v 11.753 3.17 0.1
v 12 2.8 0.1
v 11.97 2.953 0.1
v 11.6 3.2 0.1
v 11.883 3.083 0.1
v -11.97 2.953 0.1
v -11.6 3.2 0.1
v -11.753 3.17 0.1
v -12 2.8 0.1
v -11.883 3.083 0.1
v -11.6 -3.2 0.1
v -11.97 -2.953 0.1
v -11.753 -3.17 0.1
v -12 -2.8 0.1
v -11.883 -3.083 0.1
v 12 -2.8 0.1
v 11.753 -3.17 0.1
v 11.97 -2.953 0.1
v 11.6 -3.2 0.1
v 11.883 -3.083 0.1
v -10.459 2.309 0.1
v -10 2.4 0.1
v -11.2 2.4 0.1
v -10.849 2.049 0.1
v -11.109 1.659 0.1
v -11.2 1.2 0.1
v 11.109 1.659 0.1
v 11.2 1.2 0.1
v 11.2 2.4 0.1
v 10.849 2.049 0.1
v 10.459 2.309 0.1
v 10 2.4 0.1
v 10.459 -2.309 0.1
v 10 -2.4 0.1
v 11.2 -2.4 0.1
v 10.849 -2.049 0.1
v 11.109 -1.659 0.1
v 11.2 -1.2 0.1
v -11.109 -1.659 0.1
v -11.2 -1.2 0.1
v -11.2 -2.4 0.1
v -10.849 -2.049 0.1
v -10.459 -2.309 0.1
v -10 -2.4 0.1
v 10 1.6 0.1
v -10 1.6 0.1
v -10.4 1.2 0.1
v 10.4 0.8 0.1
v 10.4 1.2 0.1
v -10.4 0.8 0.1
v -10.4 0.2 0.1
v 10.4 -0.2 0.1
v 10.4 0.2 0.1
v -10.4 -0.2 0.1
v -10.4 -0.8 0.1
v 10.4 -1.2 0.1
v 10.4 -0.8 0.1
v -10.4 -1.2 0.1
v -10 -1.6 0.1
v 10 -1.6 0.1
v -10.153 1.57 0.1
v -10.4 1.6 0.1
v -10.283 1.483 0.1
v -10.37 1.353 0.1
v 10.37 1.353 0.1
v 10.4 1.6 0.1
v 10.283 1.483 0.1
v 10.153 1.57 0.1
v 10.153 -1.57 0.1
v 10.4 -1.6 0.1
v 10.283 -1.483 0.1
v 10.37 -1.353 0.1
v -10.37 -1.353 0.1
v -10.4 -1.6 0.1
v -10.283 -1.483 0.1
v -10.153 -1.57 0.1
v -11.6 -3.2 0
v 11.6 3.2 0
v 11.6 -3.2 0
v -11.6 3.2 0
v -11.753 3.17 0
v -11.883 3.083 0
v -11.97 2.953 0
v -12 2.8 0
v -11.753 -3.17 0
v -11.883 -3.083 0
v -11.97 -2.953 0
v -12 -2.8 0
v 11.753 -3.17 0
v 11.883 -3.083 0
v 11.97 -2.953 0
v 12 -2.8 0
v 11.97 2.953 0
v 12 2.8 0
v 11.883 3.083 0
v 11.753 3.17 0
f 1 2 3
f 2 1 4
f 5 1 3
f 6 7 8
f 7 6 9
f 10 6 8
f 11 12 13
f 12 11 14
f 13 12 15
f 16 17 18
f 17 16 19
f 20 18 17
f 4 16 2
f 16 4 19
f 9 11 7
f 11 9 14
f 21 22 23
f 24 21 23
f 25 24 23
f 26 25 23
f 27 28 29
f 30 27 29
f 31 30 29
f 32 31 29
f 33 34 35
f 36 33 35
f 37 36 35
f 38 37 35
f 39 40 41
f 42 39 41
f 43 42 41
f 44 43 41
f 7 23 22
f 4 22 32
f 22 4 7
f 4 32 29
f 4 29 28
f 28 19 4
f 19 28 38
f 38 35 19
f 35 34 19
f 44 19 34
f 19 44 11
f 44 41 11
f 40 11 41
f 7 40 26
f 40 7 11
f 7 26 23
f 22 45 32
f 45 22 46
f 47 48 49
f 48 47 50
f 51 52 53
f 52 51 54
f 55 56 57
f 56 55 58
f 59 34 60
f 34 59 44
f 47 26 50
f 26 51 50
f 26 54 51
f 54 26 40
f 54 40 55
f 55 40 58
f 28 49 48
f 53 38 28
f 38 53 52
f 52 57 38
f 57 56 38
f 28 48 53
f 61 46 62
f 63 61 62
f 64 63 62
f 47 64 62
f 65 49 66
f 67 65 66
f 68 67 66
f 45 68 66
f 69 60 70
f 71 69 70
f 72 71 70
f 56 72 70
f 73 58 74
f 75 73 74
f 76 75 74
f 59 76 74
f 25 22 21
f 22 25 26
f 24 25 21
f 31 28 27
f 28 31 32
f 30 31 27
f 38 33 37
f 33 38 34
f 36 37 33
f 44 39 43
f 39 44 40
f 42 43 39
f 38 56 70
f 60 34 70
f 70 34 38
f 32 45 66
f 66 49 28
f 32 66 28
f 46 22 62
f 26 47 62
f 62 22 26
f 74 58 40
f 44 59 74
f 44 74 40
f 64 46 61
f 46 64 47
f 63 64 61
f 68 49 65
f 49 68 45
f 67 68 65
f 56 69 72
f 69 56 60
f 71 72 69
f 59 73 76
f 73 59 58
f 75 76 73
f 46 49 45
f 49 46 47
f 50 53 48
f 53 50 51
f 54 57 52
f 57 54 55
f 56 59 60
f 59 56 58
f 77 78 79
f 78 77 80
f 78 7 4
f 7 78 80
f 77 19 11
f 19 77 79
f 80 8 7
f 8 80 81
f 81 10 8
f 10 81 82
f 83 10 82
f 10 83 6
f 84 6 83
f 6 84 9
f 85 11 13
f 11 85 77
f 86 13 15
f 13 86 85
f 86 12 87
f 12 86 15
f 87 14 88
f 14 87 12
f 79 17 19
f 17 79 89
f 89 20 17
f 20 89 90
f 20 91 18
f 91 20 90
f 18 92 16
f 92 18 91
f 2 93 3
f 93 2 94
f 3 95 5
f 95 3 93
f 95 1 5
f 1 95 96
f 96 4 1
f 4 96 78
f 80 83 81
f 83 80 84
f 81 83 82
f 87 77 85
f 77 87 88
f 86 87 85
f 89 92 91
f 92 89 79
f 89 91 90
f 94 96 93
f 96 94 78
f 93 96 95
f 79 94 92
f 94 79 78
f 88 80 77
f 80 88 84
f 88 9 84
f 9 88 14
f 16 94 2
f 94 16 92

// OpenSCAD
// file: ../p/4-4edge.scad
use <../lib.scad>
$fa=1; $fs=0.2;
function ldraw_lib__4_4edge(realsolid=false) = [
// 0 Circle 1.0
// 0 Name: 4-4edge.dat
// 0 Author: James Jessiman
// 0 !LDRAW_ORG Primitive UPDATE 2017-01
// 0 !LICENSE Licensed under CC BY 2.0 and CC BY 4.0 : see CAreadme.txt
// 
// 0 BFC CERTIFY CCW
  [0,"BFC","CERTIFY"],
  [0,"BFC","CCW"],
// 
// 0 !HISTORY 1998-12-15 [PTadmin] Official Update 1998-10
// 0 !HISTORY 2005-12-28 [PTadmin] Official Update 2005-01
// 0 !HISTORY 2007-06-24 [PTadmin] Header formatted for Contributor Agreement
// 0 !HISTORY 2008-07-01 [PTadmin] Official Update 2008-01
// 0 !HISTORY 2017-01-15 [Steffen] BFCed
// 0 !HISTORY 2017-12-30 [PTadmin] Official Update 2017-01
// 
// 
// 2 24 1 0 0 0.9239 0 0.3827
  [2,24,1,0,0,0.9239,0,0.3827],
// 2 24 0.9239 0 0.3827 0.7071 0 0.7071
  [2,24,0.9239,0,0.3827,0.7071,0,0.7071],
// 2 24 0.7071 0 0.7071 0.3827 0 0.9239
  [2,24,0.7071,0,0.7071,0.3827,0,0.9239],
// 2 24 0.3827 0 0.9239 0 0 1
  [2,24,0.3827,0,0.9239,0,0,1],
// 2 24 0 0 1 -0.3827 0 0.9239
  [2,24,0,0,1,-0.3827,0,0.9239],
// 2 24 -0.3827 0 0.9239 -0.7071 0 0.7071
  [2,24,-0.3827,0,0.9239,-0.7071,0,0.7071],
// 2 24 -0.7071 0 0.7071 -0.9239 0 0.3827
  [2,24,-0.7071,0,0.7071,-0.9239,0,0.3827],
// 2 24 -0.9239 0 0.3827 -1 0 -0
  [2,24,-0.9239,0,0.3827,-1,0,-0],
// 2 24 -1 0 -0 -0.9239 0 -0.3827
  [2,24,-1,0,-0,-0.9239,0,-0.3827],
// 2 24 -0.9239 0 -0.3827 -0.7071 0 -0.7071
  [2,24,-0.9239,0,-0.3827,-0.7071,0,-0.7071],
// 2 24 -0.7071 0 -0.7071 -0.3827 0 -0.9239
  [2,24,-0.7071,0,-0.7071,-0.3827,0,-0.9239],
// 2 24 -0.3827 0 -0.9239 0 0 -1
  [2,24,-0.3827,0,-0.9239,0,0,-1],
// 2 24 0 0 -1 0.3827 0 -0.9239
  [2,24,0,0,-1,0.3827,0,-0.9239],
// 2 24 0.3827 0 -0.9239 0.7071 0 -0.7071
  [2,24,0.3827,0,-0.9239,0.7071,0,-0.7071],
// 2 24 0.7071 0 -0.7071 0.9239 0 -0.3827
  [2,24,0.7071,0,-0.7071,0.9239,0,-0.3827],
// 2 24 0.9239 0 -0.3827 1 0 0
  [2,24,0.9239,0,-0.3827,1,0,0],
];
module ldraw_lib__4_4edge(step=0, col=false, unit=2/5, alt=false, line=0.2, solid=!$preview)
    makepoly(ldraw_lib__4_4edge(solid), step=step, col=col, unit=unit, alt=alt, line=line, solid=solid);
ldraw_lib__4_4edge(line=0.2);
// file: ../p/4-4disc.scad
use <../lib.scad>
$fa=1; $fs=0.2;
function ldraw_lib__4_4disc(realsolid=false) = [
// 0 Disc 1.0
// 0 Name: 4-4disc.dat
// 0 Author: James Jessiman
// 0 !LDRAW_ORG Primitive UPDATE 2002-02
// 0 !LICENSE Licensed under CC BY 2.0 and CC BY 4.0 : see CAreadme.txt
// 
// 0 BFC CERTIFY CCW
  [0,"BFC","CERTIFY"],
  [0,"BFC","CCW"],
// 
// 0 !HISTORY 1998-12-15 [PTadmin] Official Update 1998-10
// 0 !HISTORY 2002-03-23 [sbliss] Added BFC statement
// 0 !HISTORY 2002-04-25 [PTadmin] Official Update 2002-02
// 0 !HISTORY 2007-06-24 [PTadmin] Header formatted for Contributor Agreement
// 0 !HISTORY 2008-07-01 [PTadmin] Official Update 2008-01
// 
// 
// 3 16 0 0 0 1 0 0 0.9239 0 0.3827
  [3,16,0,0,0,1,0,0,0.9239,0,0.3827],
// 3 16 0 0 0 0.9239 0 0.3827 0.7071 0 0.7071
  [3,16,0,0,0,0.9239,0,0.3827,0.7071,0,0.7071],
// 3 16 0 0 0 0.7071 0 0.7071 0.3827 0 0.9239
  [3,16,0,0,0,0.7071,0,0.7071,0.3827,0,0.9239],
// 3 16 0 0 0 0.3827 0 0.9239 0 0 1
  [3,16,0,0,0,0.3827,0,0.9239,0,0,1],
// 3 16 0 0 0 0 0 1 -0.3827 0 0.9239
  [3,16,0,0,0,0,0,1,-0.3827,0,0.9239],
// 3 16 0 0 0 -0.3827 0 0.9239 -0.7071 0 0.7071
  [3,16,0,0,0,-0.3827,0,0.9239,-0.7071,0,0.7071],
// 3 16 0 0 0 -0.7071 0 0.7071 -0.9239 0 0.3827
  [3,16,0,0,0,-0.7071,0,0.7071,-0.9239,0,0.3827],
// 3 16 0 0 0 -0.9239 0 0.3827 -1 0 -0
  [3,16,0,0,0,-0.9239,0,0.3827,-1,0,-0],
// 3 16 0 0 0 -1 0 -0 -0.9239 0 -0.3827
  [3,16,0,0,0,-1,0,-0,-0.9239,0,-0.3827],
// 3 16 0 0 0 -0.9239 0 -0.3827 -0.7071 0 -0.7071
  [3,16,0,0,0,-0.9239,0,-0.3827,-0.7071,0,-0.7071],
// 3 16 0 0 0 -0.7071 0 -0.7071 -0.3827 0 -0.9239
  [3,16,0,0,0,-0.7071,0,-0.7071,-0.3827,0,-0.9239],
// 3 16 0 0 0 -0.3827 0 -0.9239 0 0 -1
  [3,16,0,0,0,-0.3827,0,-0.9239,0,0,-1],
// 3 16 0 0 0 0 0 -1 0.3827 0 -0.9239
  [3,16,0,0,0,0,0,-1,0.3827,0,-0.9239],
// 3 16 0 0 0 0.3827 0 -0.9239 0.7071 0 -0.7071
  [3,16,0,0,0,0.3827,0,-0.9239,0.7071,0,-0.7071],
// 3 16 0 0 0 0.7071 0 -0.7071 0.9239 0 -0.3827
  [3,16,0,0,0,0.7071,0,-0.7071,0.9239,0,-0.3827],
// 3 16 0 0 0 0.9239 0 -0.3827 1 0 0
  [3,16,0,0,0,0.9239,0,-0.3827,1,0,0],
// 0
];
module ldraw_lib__4_4disc(step=0, col=false, unit=2/5, alt=false, line=0.2, solid=!$preview)
    makepoly(ldraw_lib__4_4disc(solid), step=step, col=col, unit=unit, alt=alt, line=line, solid=solid);
ldraw_lib__4_4disc(line=0.2);
// file: ../p/4-4cyli.scad
use <../lib.scad>
$fa=1; $fs=0.2;
function ldraw_lib__4_4cyli(realsolid=false) = [
// 0 Cylinder 1.0
// 0 Name: 4-4cyli.dat
// 0 Author: James Jessiman
// 0 !LDRAW_ORG Primitive UPDATE 2005-01
// 0 !LICENSE Licensed under CC BY 2.0 and CC BY 4.0 : see CAreadme.txt
// 
// 0 BFC CERTIFY CCW
  [0,"BFC","CERTIFY"],
  [0,"BFC","CCW"],
// 
// 0 !HISTORY 1998-12-15 [PTadmin] Official Update 1998-10
// 0 !HISTORY 2002-03-23 [sbliss] Added BFC statement; merged headers from files in distributions LDraw 0.27 and Complete.
// 0 !HISTORY 2002-04-25 [PTadmin] Official Update 2002-02
// 0 !HISTORY 2004-12-14 [guyvivan] BFC CCW
// 0 !HISTORY 2005-12-28 [PTadmin] Official Update 2005-01
// 0 !HISTORY 2007-06-24 [PTadmin] Header formatted for Contributor Agreement
// 0 !HISTORY 2008-07-01 [PTadmin] Official Update 2008-01
// 
// 
// 4 16 1 1 0 0.9239 1 0.3827 0.9239 0 0.3827 1 0 0
  [4,16,1,1,0,0.9239,1,0.3827,0.9239,0,0.3827,1,0,0],
// 5 24 1 0 0 1 1 0 0.9239 0 0.3827 0.9239 0 -0.3827
  [5,24,1,0,0,1,1,0,0.9239,0,0.3827,0.9239,0,-0.3827],
// 4 16 0.9239 1 0.3827 0.7071 1 0.7071 0.7071 0 0.7071 0.9239 0 0.3827
  [4,16,0.9239,1,0.3827,0.7071,1,0.7071,0.7071,0,0.7071,0.9239,0,0.3827],
// 5 24 0.9239 0 0.3827 0.9239 1 0.3827 0.7071 0 0.7071 1 0 0
  [5,24,0.9239,0,0.3827,0.9239,1,0.3827,0.7071,0,0.7071,1,0,0],
// 4 16 0.7071 1 0.7071 0.3827 1 0.9239 0.3827 0 0.9239 0.7071 0 0.7071
  [4,16,0.7071,1,0.7071,0.3827,1,0.9239,0.3827,0,0.9239,0.7071,0,0.7071],
// 5 24 0.7071 0 0.7071 0.7071 1 0.7071 0.3827 0 0.9239 0.9239 0 0.3827
  [5,24,0.7071,0,0.7071,0.7071,1,0.7071,0.3827,0,0.9239,0.9239,0,0.3827],
// 4 16 0.3827 1 0.9239 0 1 1 0 0 1 0.3827 0 0.9239
  [4,16,0.3827,1,0.9239,0,1,1,0,0,1,0.3827,0,0.9239],
// 5 24 0.3827 0 0.9239 0.3827 1 0.9239 0 0 1 0.7071 0 0.7071
  [5,24,0.3827,0,0.9239,0.3827,1,0.9239,0,0,1,0.7071,0,0.7071],
// 4 16 0 1 1 -0.3827 1 0.9239 -0.3827 0 0.9239 0 0 1
  [4,16,0,1,1,-0.3827,1,0.9239,-0.3827,0,0.9239,0,0,1],
// 5 24 0 0 1 0 1 1 -0.3827 0 0.9239 0.3827 0 0.9239
  [5,24,0,0,1,0,1,1,-0.3827,0,0.9239,0.3827,0,0.9239],
// 4 16 -0.3827 1 0.9239 -0.7071 1 0.7071 -0.7071 0 0.7071 -0.3827 0 0.9239
  [4,16,-0.3827,1,0.9239,-0.7071,1,0.7071,-0.7071,0,0.7071,-0.3827,0,0.9239],
// 5 24 -0.3827 0 0.9239 -0.3827 1 0.9239 -0.7071 0 0.7071 0 0 1
  [5,24,-0.3827,0,0.9239,-0.3827,1,0.9239,-0.7071,0,0.7071,0,0,1],
// 4 16 -0.7071 1 0.7071 -0.9239 1 0.3827 -0.9239 0 0.3827 -0.7071 0 0.7071
  [4,16,-0.7071,1,0.7071,-0.9239,1,0.3827,-0.9239,0,0.3827,-0.7071,0,0.7071],
// 5 24 -0.7071 0 0.7071 -0.7071 1 0.7071 -0.9239 0 0.3827 -0.3827 0 0.9239
  [5,24,-0.7071,0,0.7071,-0.7071,1,0.7071,-0.9239,0,0.3827,-0.3827,0,0.9239],
// 4 16 -0.9239 1 0.3827 -1 1 0 -1 0 0 -0.9239 0 0.3827
  [4,16,-0.9239,1,0.3827,-1,1,0,-1,0,0,-0.9239,0,0.3827],
// 5 24 -0.9239 0 0.3827 -0.9239 1 0.3827 -1 0 0 -0.7071 0 0.7071
  [5,24,-0.9239,0,0.3827,-0.9239,1,0.3827,-1,0,0,-0.7071,0,0.7071],
// 4 16 -1 1 0 -0.9239 1 -0.3827 -0.9239 0 -0.3827 -1 0 0
  [4,16,-1,1,0,-0.9239,1,-0.3827,-0.9239,0,-0.3827,-1,0,0],
// 5 24 -1 0 0 -1 1 0 -0.9239 0 -0.3827 -0.9239 0 0.3827
  [5,24,-1,0,0,-1,1,0,-0.9239,0,-0.3827,-0.9239,0,0.3827],
// 4 16 -0.9239 1 -0.3827 -0.7071 1 -0.7071 -0.7071 0 -0.7071 -0.9239 0 -0.3827
  [4,16,-0.9239,1,-0.3827,-0.7071,1,-0.7071,-0.7071,0,-0.7071,-0.9239,0,-0.3827],
// 5 24 -0.9239 0 -0.3827 -0.9239 1 -0.3827 -0.7071 0 -0.7071 -1 0 0
  [5,24,-0.9239,0,-0.3827,-0.9239,1,-0.3827,-0.7071,0,-0.7071,-1,0,0],
// 4 16 -0.7071 1 -0.7071 -0.3827 1 -0.9239 -0.3827 0 -0.9239 -0.7071 0 -0.7071
  [4,16,-0.7071,1,-0.7071,-0.3827,1,-0.9239,-0.3827,0,-0.9239,-0.7071,0,-0.7071],
// 5 24 -0.7071 0 -0.7071 -0.7071 1 -0.7071 -0.3827 0 -0.9239 -0.9239 0 -0.3827
  [5,24,-0.7071,0,-0.7071,-0.7071,1,-0.7071,-0.3827,0,-0.9239,-0.9239,0,-0.3827],
// 4 16 -0.3827 1 -0.9239 0 1 -1 0 0 -1 -0.3827 0 -0.9239
  [4,16,-0.3827,1,-0.9239,0,1,-1,0,0,-1,-0.3827,0,-0.9239],
// 5 24 -0.3827 0 -0.9239 -0.3827 1 -0.9239 0 0 -1 -0.7071 0 -0.7071
  [5,24,-0.3827,0,-0.9239,-0.3827,1,-0.9239,0,0,-1,-0.7071,0,-0.7071],
// 4 16 0 1 -1 0.3827 1 -0.9239 0.3827 0 -0.9239 0 0 -1
  [4,16,0,1,-1,0.3827,1,-0.9239,0.3827,0,-0.9239,0,0,-1],
// 5 24 0 0 -1 0 1 -1 0.3827 0 -0.9239 -0.3827 0 -0.9239
  [5,24,0,0,-1,0,1,-1,0.3827,0,-0.9239,-0.3827,0,-0.9239],
// 4 16 0.3827 1 -0.9239 0.7071 1 -0.7071 0.7071 0 -0.7071 0.3827 0 -0.9239
  [4,16,0.3827,1,-0.9239,0.7071,1,-0.7071,0.7071,0,-0.7071,0.3827,0,-0.9239],
// 5 24 0.3827 0 -0.9239 0.3827 1 -0.9239 0.7071 0 -0.7071 0 0 -1
  [5,24,0.3827,0,-0.9239,0.3827,1,-0.9239,0.7071,0,-0.7071,0,0,-1],
// 4 16 0.7071 1 -0.7071 0.9239 1 -0.3827 0.9239 0 -0.3827 0.7071 0 -0.7071
  [4,16,0.7071,1,-0.7071,0.9239,1,-0.3827,0.9239,0,-0.3827,0.7071,0,-0.7071],
// 5 24 0.7071 0 -0.7071 0.7071 1 -0.7071 0.9239 0 -0.3827 0.3827 0 -0.9239
  [5,24,0.7071,0,-0.7071,0.7071,1,-0.7071,0.9239,0,-0.3827,0.3827,0,-0.9239],
// 4 16 0.9239 1 -0.3827 1 1 0 1 0 0 0.9239 0 -0.3827
  [4,16,0.9239,1,-0.3827,1,1,0,1,0,0,0.9239,0,-0.3827],
// 5 24 0.9239 0 -0.3827 0.9239 1 -0.3827 1 0 0 0.7071 0 -0.7071
  [5,24,0.9239,0,-0.3827,0.9239,1,-0.3827,1,0,0,0.7071,0,-0.7071],
// 0
];
module ldraw_lib__4_4cyli(step=0, col=false, unit=2/5, alt=false, line=0.2, solid=!$preview)
    makepoly(ldraw_lib__4_4cyli(solid), step=step, col=col, unit=unit, alt=alt, line=line, solid=solid);
ldraw_lib__4_4cyli(line=0.2);
// file: ../p/stud3.scad
use <../lib.scad>
use <4-4cyli.scad>
use <4-4disc.scad>
use <4-4edge.scad>
$fa=1; $fs=0.2;
function ldraw_lib__stud3(realsolid=false) = realsolid ? 
    [openscad(translate([0,0,-eps()], o=cylinder(4+eps(), r=4)),2)] : [
// 0 Stud Tube Solid
// 0 Name: stud3.dat
// 0 Author: James Jessiman
// 0 !LDRAW_ORG Primitive UPDATE 2012-01
// 0 !LICENSE Licensed under CC BY 2.0 and CC BY 4.0 : see CAreadme.txt
// 
// 0 BFC CERTIFY CCW
  [0,"BFC","CERTIFY"],
  [0,"BFC","CCW"],
// 
// 0 !HISTORY 2002-04-04 [sbliss] Modified for BFC compliance
// 0 !HISTORY 2002-04-25 [PTadmin] Official Update 2002-02
// 0 !HISTORY 2007-06-24 [PTadmin] Header formatted for Contributor Agreement
// 0 !HISTORY 2008-07-01 [PTadmin] Official Update 2008-01
// 0 !HISTORY 2012-02-16 [Philo] Changed to CCW
// 0 !HISTORY 2012-03-30 [PTadmin] Official Update 2012-01
// 
// 
// 1 16 0 -4 0 4 0 0 0 1 0 0 0 4 4-4edge.dat
  [1,16,0,-4,0,4,0,0,0,1,0,0,0,4, ldraw_lib__4_4edge(realsolid)],
// 1 16 0 0 0 4 0 0 0 1 0 0 0 4 4-4edge.dat
  [1,16,0,0,0,4,0,0,0,1,0,0,0,4, ldraw_lib__4_4edge(realsolid)],
// 1 16 0 -4 0 4 0 0 0 1 0 0 0 4 4-4disc.dat
  [1,16,0,-4,0,4,0,0,0,1,0,0,0,4, ldraw_lib__4_4disc(realsolid)],
// 1 16 0 -4 0 4 0 0 0 4 0 0 0 4 4-4cyli.dat
  [1,16,0,-4,0,4,0,0,0,4,0,0,0,4, ldraw_lib__4_4cyli(realsolid)],
];
module ldraw_lib__stud3(step=0, col=false, unit=2/5, alt=false, line=0.2, solid=!$preview)
    makepoly(ldraw_lib__stud3(solid), step=step, col=col, unit=unit, alt=alt, line=line, solid=solid);
ldraw_lib__stud3(line=0.2);
// file: ../p/stud.scad
use <../lib.scad>
use <4-4cyli.scad>
use <4-4disc.scad>
use <4-4edge.scad>
$fa=1; $fs=0.2;
function ldraw_lib__stud(realsolid=false) = realsolid ? 
    [openscad(translate([0,0,-eps()], o=cylinder(4+eps(), r=6)),2)] : [
// 0 Stud
// 0 Name: stud.dat
// 0 Author: James Jessiman
// 0 !LDRAW_ORG Primitive UPDATE 2012-01
// 0 !LICENSE Licensed under CC BY 2.0 and CC BY 4.0 : see CAreadme.txt
// 
// 0 BFC CERTIFY CCW
  [0,"BFC","CERTIFY"],
  [0,"BFC","CCW"],
// 
// 0 !HISTORY 2002-04-04 [sbliss] Modified for BFC compliance
// 0 !HISTORY 2002-04-25 [PTadmin] Official Update 2002-02
// 0 !HISTORY 2007-06-24 [PTadmin] Header formatted for Contributor Agreement
// 0 !HISTORY 2008-07-01 [PTadmin] Official Update 2008-01
// 0 !HISTORY 2012-02-16 [Philo] Changed to CCW
// 0 !HISTORY 2012-03-30 [PTadmin] Official Update 2012-01
// 
// 
// 1 16 0 0 0 6 0 0 0 1 0 0 0 6 4-4edge.dat
  [1,16,0,0,0,6,0,0,0,1,0,0,0,6, ldraw_lib__4_4edge(realsolid)],
// 1 16 0 -4 0 6 0 0 0 1 0 0 0 6 4-4edge.dat
  [1,16,0,-4,0,6,0,0,0,1,0,0,0,6, ldraw_lib__4_4edge(realsolid)],
// 1 16 0 0 0 6 0 0 0 -4 0 0 0 6 4-4cyli.dat
  [1,16,0,0,0,6,0,0,0,-4,0,0,0,6, ldraw_lib__4_4cyli(realsolid)],
// 1 16 0 -4 0 6 0 0 0 1 0 0 0 6 4-4disc.dat
  [1,16,0,-4,0,6,0,0,0,1,0,0,0,6, ldraw_lib__4_4disc(realsolid)],
];
module ldraw_lib__stud(step=0, col=false, unit=2/5, alt=false, line=0.2, solid=!$preview)
    makepoly(ldraw_lib__stud(solid), step=step, col=col, unit=unit, alt=alt, line=line, solid=solid);
ldraw_lib__stud(line=0.2);
// file: ../p/box5.scad
use <../lib.scad>
$fa=1; $fs=0.2;
function ldraw_lib__box5(realsolid=false) = [
// 0 Box with 5 Faces and All Edges
// 0 Name: box5.dat
// 0 Author: James Jessiman
// 0 !LDRAW_ORG Primitive UPDATE 2012-01
// 0 !LICENSE Licensed under CC BY 2.0 and CC BY 4.0 : see CAreadme.txt
// 
// 0 BFC CERTIFY CCW
  [0,"BFC","CERTIFY"],
  [0,"BFC","CCW"],
// 
// 0 !HISTORY 2002-04-03 [sbliss] Modified for BFC compliance
// 0 !HISTORY 2002-04-25 [PTadmin] Official Update 2002-02
// 0 !HISTORY 2007-06-24 [PTadmin] Header formatted for Contributor Agreement
// 0 !HISTORY 2008-07-01 [PTadmin] Official Update 2008-01
// 0 !HISTORY 2012-02-16 [Philo] Changed to CCW
// 0 !HISTORY 2012-03-30 [PTadmin] Official Update 2012-01
// 
// 
// 2 24 1 1 1 -1 1 1
  [2,24,1,1,1,-1,1,1],
// 2 24 -1 1 1 -1 1 -1
  [2,24,-1,1,1,-1,1,-1],
// 2 24 -1 1 -1 1 1 -1
  [2,24,-1,1,-1,1,1,-1],
// 2 24 1 1 -1 1 1 1
  [2,24,1,1,-1,1,1,1],
// 2 24 1 0 1 -1 0 1
  [2,24,1,0,1,-1,0,1],
// 2 24 -1 0 1 -1 0 -1
  [2,24,-1,0,1,-1,0,-1],
// 2 24 -1 0 -1 1 0 -1
  [2,24,-1,0,-1,1,0,-1],
// 2 24 1 0 -1 1 0 1
  [2,24,1,0,-1,1,0,1],
// 2 24 1 0 1 1 1 1
  [2,24,1,0,1,1,1,1],
// 2 24 -1 0 1 -1 1 1
  [2,24,-1,0,1,-1,1,1],
// 2 24 1 0 -1 1 1 -1
  [2,24,1,0,-1,1,1,-1],
// 2 24 -1 0 -1 -1 1 -1
  [2,24,-1,0,-1,-1,1,-1],
// 4 16 -1 1 1 1 1 1 1 1 -1 -1 1 -1
  [4,16,-1,1,1,1,1,1,1,1,-1,-1,1,-1],
// 4 16 -1 1 1 -1 0 1 1 0 1 1 1 1
  [4,16,-1,1,1,-1,0,1,1,0,1,1,1,1],
// 4 16 -1 1 -1 -1 0 -1 -1 0 1 -1 1 1
  [4,16,-1,1,-1,-1,0,-1,-1,0,1,-1,1,1],
// 4 16 1 1 -1 1 0 -1 -1 0 -1 -1 1 -1
  [4,16,1,1,-1,1,0,-1,-1,0,-1,-1,1,-1],
// 4 16 1 1 1 1 0 1 1 0 -1 1 1 -1
  [4,16,1,1,1,1,0,1,1,0,-1,1,1,-1],
];
module ldraw_lib__box5(step=0, col=false, unit=2/5, alt=false, line=0.2, solid=!$preview)
    makepoly(ldraw_lib__box5(solid), step=step, col=col, unit=unit, alt=alt, line=line, solid=solid);
ldraw_lib__box5(line=0.2);
// file: ../p/box4t.scad
use <../lib.scad>
$fa=1; $fs=0.2;
function ldraw_lib__box4t(realsolid=false) = [
// 0 Box with 4 Adjacent Faces and All Edges
// 0 Name: box4t.dat
// 0 Author: Tore Eriksson [Tore_Eriksson]
// 0 !LDRAW_ORG Primitive UPDATE 2003-02
// 0 !LICENSE Licensed under CC BY 2.0 and CC BY 4.0 : see CAreadme.txt
// 
// 0 BFC CERTIFY CCW
  [0,"BFC","CERTIFY"],
  [0,"BFC","CCW"],
// 
// 0 !HISTORY 1997-09-29 [PTadmin] Official Update 1997-15
// 0 !HISTORY 2002-08-31 [izanette] Modified with WINDZ for BFC compliance
// 0 !HISTORY 2003-08-01 [PTadmin] Official Update 2003-02
// 0 !HISTORY 2007-06-24 [PTadmin] Header formatted for Contributor Agreement
// 0 !HISTORY 2008-07-01 [PTadmin] Official Update 2008-01
// 
// 
// 2 24 1 1 1 -1 1 1
  [2,24,1,1,1,-1,1,1],
// 2 24 -1 1 1 -1 1 -1
  [2,24,-1,1,1,-1,1,-1],
// 2 24 -1 1 -1 1 1 -1
  [2,24,-1,1,-1,1,1,-1],
// 2 24 1 1 -1 1 1 1
  [2,24,1,1,-1,1,1,1],
// 2 24 1 0 1 -1 0 1
  [2,24,1,0,1,-1,0,1],
// 2 24 -1 0 1 -1 0 -1
  [2,24,-1,0,1,-1,0,-1],
// 2 24 -1 0 -1 1 0 -1
  [2,24,-1,0,-1,1,0,-1],
// 2 24 1 0 -1 1 0 1
  [2,24,1,0,-1,1,0,1],
// 2 24 1 0 1 1 1 1
  [2,24,1,0,1,1,1,1],
// 2 24 -1 0 1 -1 1 1
  [2,24,-1,0,1,-1,1,1],
// 2 24 1 0 -1 1 1 -1
  [2,24,1,0,-1,1,1,-1],
// 2 24 -1 0 -1 -1 1 -1
  [2,24,-1,0,-1,-1,1,-1],
// 4 16 1 1 1 1 1 -1 -1 1 -1 -1 1 1
  [4,16,1,1,1,1,1,-1,-1,1,-1,-1,1,1],
// 4 16 1 1 1 -1 1 1 -1 0 1 1 0 1
  [4,16,1,1,1,-1,1,1,-1,0,1,1,0,1],
// 4 16 -1 1 1 -1 1 -1 -1 0 -1 -1 0 1
  [4,16,-1,1,1,-1,1,-1,-1,0,-1,-1,0,1],
// 0 4 16 -1 1 -1 -1 0 -1 1 0 -1 1 1 -1
// 4 16 1 1 -1 1 1 1 1 0 1 1 0 -1
  [4,16,1,1,-1,1,1,1,1,0,1,1,0,-1],
// 0
];
module ldraw_lib__box4t(step=0, col=false, unit=2/5, alt=false, line=0.2, solid=!$preview)
    makepoly(ldraw_lib__box4t(solid), step=step, col=col, unit=unit, alt=alt, line=line, solid=solid);
ldraw_lib__box4t(line=0.2);
// file: s/3004s01.scad
use <../../lib.scad>
use <../../p/box4t.scad>
use <../../p/box5.scad>
use <../../p/stud.scad>
use <../../p/stud3.scad>
$fa=1; $fs=0.2;
function ldraw_lib__s__3004s01(realsolid=false) = [
// 0 ~Brick  1 x  2 without Front Face
// 0 Name: s\3004s01.dat
// 0 Author: James Jessiman
// 0 !LDRAW_ORG Subpart UPDATE 2003-03
// 0 !LICENSE Licensed under CC BY 2.0 and CC BY 4.0 : see CAreadme.txt
// 
// 0 BFC CERTIFY CCW
  [0,"BFC","CERTIFY"],
  [0,"BFC","CCW"],
// 
// 0 !HISTORY 2003-09-07 [jriley] Subfiling, BFC
// 0 !HISTORY 2003-12-19 [PTadmin] Official Update 2003-03
// 0 !HISTORY 2007-08-29 [PTadmin] Header formatted for Contributor Agreement
// 0 !HISTORY 2008-07-01 [PTadmin] Official Update 2008-01
// 
// 
// 1 16 0 4 0 1 0 0 0 -5 0 0 0 1 stud3.dat
  [1,16,0,4,0,1,0,0,0,-5,0,0,0,1, ldraw_lib__stud3(realsolid)],
// 0 BFC INVERTNEXT
  [0,"BFC","INVERTNEXT"],
// 1 16 0 24 0 16 0 0 0 -20 0 0 0 6 box5.dat
  [1,16,0,24,0,16,0,0,0,-20,0,0,0,6, ldraw_lib__box5(realsolid)],
// 4 16 20 24 10 16 24 6 -16 24 6 -20 24 10
  [4,16,20,24,10,16,24,6,-16,24,6,-20,24,10],
// 4 16 -20 24 10 -16 24 6 -16 24 -6 -20 24 -10
  [4,16,-20,24,10,-16,24,6,-16,24,-6,-20,24,-10],
// 4 16 -20 24 -10 -16 24 -6 16 24 -6 20 24 -10
  [4,16,-20,24,-10,-16,24,-6,16,24,-6,20,24,-10],
// 4 16 20 24 -10 16 24 -6 16 24 6 20 24 10
  [4,16,20,24,-10,16,24,-6,16,24,6,20,24,10],
// 1 16 0 24 0 20 0 0 0 -24 0 0 0 10 box4t.dat
  [1,16,0,24,0,20,0,0,0,-24,0,0,0,10, ldraw_lib__box4t(realsolid)],
// 1 16 10 0 0 1 0 0 0 1 0 0 0 1 stud.dat
  [1,16,10,0,0,1,0,0,0,1,0,0,0,1, ldraw_lib__stud(realsolid)],
// 1 16 -10 0 0 1 0 0 0 1 0 0 0 1 stud.dat
  [1,16,-10,0,0,1,0,0,0,1,0,0,0,1, ldraw_lib__stud(realsolid)],
// 0
];
module ldraw_lib__s__3004s01(step=0, col=false, unit=2/5, alt=false, line=0.2, solid=!$preview)
    makepoly(ldraw_lib__s__3004s01(solid), step=step, col=col, unit=unit, alt=alt, line=line, solid=solid);
ldraw_lib__s__3004s01(line=0.2);
// file: ../p/box3u12.scad
use <../lib.scad>
$fa=1; $fs=0.2;
function ldraw_lib__box3u12(realsolid=false) = [
// 0 Box with 3 Parallel Faces without Any Edges
// 0 Name: box3u12.dat
// 0 Author: J.C. Tchang [tchang]
// 0 !LDRAW_ORG Primitive UPDATE 2014-02
// 0 !LICENSE Licensed under CC BY 2.0 and CC BY 4.0 : see CAreadme.txt
// 
// 0 BFC CERTIFY CCW
  [0,"BFC","CERTIFY"],
  [0,"BFC","CCW"],
// 
// 0 !HISTORY 2014-12-23 [PTadmin] Official Update 2014-02
// 
// 
// 4 16 -1 1 1 1 1 1 1 1 -1 -1 1 -1
  [4,16,-1,1,1,1,1,1,1,1,-1,-1,1,-1],
// 4 16 -1 1 1 -1 0 1 1 0 1 1 1 1
  [4,16,-1,1,1,-1,0,1,1,0,1,1,1,1],
// 4 16 1 1 -1 1 0 -1 -1 0 -1 -1 1 -1
  [4,16,1,1,-1,1,0,-1,-1,0,-1,-1,1,-1],
];
module ldraw_lib__box3u12(step=0, col=false, unit=2/5, alt=false, line=0.2, solid=!$preview)
    makepoly(ldraw_lib__box3u12(solid), step=step, col=col, unit=unit, alt=alt, line=line, solid=solid);
ldraw_lib__box3u12(line=0.2);
// file: ../p/1-4cyli.scad
use <../lib.scad>
$fa=1; $fs=0.2;
function ldraw_lib__1_4cyli(realsolid=false) = [
// 0 Cylinder 0.25
// 0 Name: 1-4cyli.dat
// 0 Author: James Jessiman
// 0 !LDRAW_ORG Primitive UPDATE 2012-01
// 0 !LICENSE Licensed under CC BY 2.0 and CC BY 4.0 : see CAreadme.txt
// 
// 0 BFC CERTIFY CCW
  [0,"BFC","CERTIFY"],
  [0,"BFC","CCW"],
// 
// 0 !HISTORY 2002-03-23 [sbliss] Added BFC statement.
// 0 !HISTORY 2002-04-25 [PTadmin] Official Update 2002-02
// 0 !HISTORY 2007-06-22 [PTadmin] Header formatted for Contributor Agreement
// 0 !HISTORY 2008-07-01 [PTadmin] Official Update 2008-01
// 0 !HISTORY 2012-02-16 [Philo] Changed to CCW
// 0 !HISTORY 2012-03-30 [PTadmin] Official Update 2012-01
// 
// 
// 4 16 1 1 0 0.9239 1 0.3827 0.9239 0 0.3827 1 0 0
  [4,16,1,1,0,0.9239,1,0.3827,0.9239,0,0.3827,1,0,0],
// 5 24 1 0 0 1 1 0 0.9239 0 0.3827 1 0 -1
  [5,24,1,0,0,1,1,0,0.9239,0,0.3827,1,0,-1],
// 4 16 0.9239 1 0.3827 0.7071 1 0.7071 0.7071 0 0.7071 0.9239 0 0.3827
  [4,16,0.9239,1,0.3827,0.7071,1,0.7071,0.7071,0,0.7071,0.9239,0,0.3827],
// 5 24 0.9239 0 0.3827 0.9239 1 0.3827 0.7071 0 0.7071 1 0 0
  [5,24,0.9239,0,0.3827,0.9239,1,0.3827,0.7071,0,0.7071,1,0,0],
// 4 16 0.7071 1 0.7071 0.3827 1 0.9239 0.3827 0 0.9239 0.7071 0 0.7071
  [4,16,0.7071,1,0.7071,0.3827,1,0.9239,0.3827,0,0.9239,0.7071,0,0.7071],
// 5 24 0.7071 0 0.7071 0.7071 1 0.7071 0.3827 0 0.9239 0.9239 0 0.3827
  [5,24,0.7071,0,0.7071,0.7071,1,0.7071,0.3827,0,0.9239,0.9239,0,0.3827],
// 4 16 0.3827 1 0.9239 0 1 1 0 0 1 0.3827 0 0.9239
  [4,16,0.3827,1,0.9239,0,1,1,0,0,1,0.3827,0,0.9239],
// 5 24 0.3827 0 0.9239 0.3827 1 0.9239 0 0 1 0.7071 0 0.7071
  [5,24,0.3827,0,0.9239,0.3827,1,0.9239,0,0,1,0.7071,0,0.7071],
// 5 24 0 0 1 0 1 1 0.3827 0 0.9239 -1 0 1
  [5,24,0,0,1,0,1,1,0.3827,0,0.9239,-1,0,1],
];
module ldraw_lib__1_4cyli(step=0, col=false, unit=2/5, alt=false, line=0.2, solid=!$preview)
    makepoly(ldraw_lib__1_4cyli(solid), step=step, col=col, unit=unit, alt=alt, line=line, solid=solid);
ldraw_lib__1_4cyli(line=0.2);
// file: ../p/1-4ndis.scad
use <../lib.scad>
$fa=1; $fs=0.2;
function ldraw_lib__1_4ndis(realsolid=false) = [
// 0 Disc Negative 0.25
// 0 Name: 1-4ndis.dat
// 0 Author: James Jessiman
// 0 !LDRAW_ORG Primitive UPDATE 2012-01
// 0 !LICENSE Licensed under CC BY 2.0 and CC BY 4.0 : see CAreadme.txt
// 
// 0 BFC CERTIFY CCW
  [0,"BFC","CERTIFY"],
  [0,"BFC","CCW"],
// 
// 0 !HISTORY 2002-03-23 [sbliss] Added BFC Statement
// 0 !HISTORY 2002-04-25 [PTadmin] Official Update 2002-02
// 0 !HISTORY 2007-06-22 [PTadmin] Header formatted for Contributor Agreement
// 0 !HISTORY 2008-07-01 [PTadmin] Official Update 2008-01
// 0 !HISTORY 2012-02-16 [Philo] Changed to CCW
// 0 !HISTORY 2012-03-30 [PTadmin] Official Update 2012-01
// 
// 
// 3 16 0.9239 0 0.3827 1 0 0 1 0 1
  [3,16,0.9239,0,0.3827,1,0,0,1,0,1],
// 3 16 0.7071 0 0.7071 0.9239 0 0.3827 1 0 1
  [3,16,0.7071,0,0.7071,0.9239,0,0.3827,1,0,1],
// 3 16 0.3827 0 0.9239 0.7071 0 0.7071 1 0 1
  [3,16,0.3827,0,0.9239,0.7071,0,0.7071,1,0,1],
// 3 16 0 0 1 0.3827 0 0.9239 1 0 1
  [3,16,0,0,1,0.3827,0,0.9239,1,0,1],
];
module ldraw_lib__1_4ndis(step=0, col=false, unit=2/5, alt=false, line=0.2, solid=!$preview)
    makepoly(ldraw_lib__1_4ndis(solid), step=step, col=col, unit=unit, alt=alt, line=line, solid=solid);
ldraw_lib__1_4ndis(line=0.2);
// file: ../p/1-4chrd.scad
use <../lib.scad>
$fa=1; $fs=0.2;
function ldraw_lib__1_4chrd(realsolid=false) = [
// 0 Chord 0.25
// 0 Name: 1-4chrd.dat
// 0 Author: Tony Hafner [hafhead]
// 0 !LDRAW_ORG Primitive UPDATE 2012-02
// 0 !LICENSE Licensed under CC BY 2.0 and CC BY 4.0 : see CAreadme.txt
// 
// 0 BFC CERTIFY CCW
  [0,"BFC","CERTIFY"],
  [0,"BFC","CCW"],
// 
// 0 !HISTORY 2004-04-22 [PTadmin] Official Update 2004-02
// 0 !HISTORY 2007-10-09 [PTadmin] Header formatted for Contributor Agreement
// 0 !HISTORY 2008-07-01 [PTadmin] Official Update 2008-01
// 0 !HISTORY 2012-08-02 [MMR1988] Re-creation with PrimGen2 and Rectifier
// 0 !HISTORY 2012-08-09 [PTadmin] Official Update 2012-02
// 
// 
// 4 16 0.9239 0 0.3827 0.3827 0 0.9239 0 0 1 1 0 0
  [4,16,0.9239,0,0.3827,0.3827,0,0.9239,0,0,1,1,0,0],
// 3 16 0.7071 0 0.7071 0.3827 0 0.9239 0.9239 0 0.3827
  [3,16,0.7071,0,0.7071,0.3827,0,0.9239,0.9239,0,0.3827],
];
module ldraw_lib__1_4chrd(step=0, col=false, unit=2/5, alt=false, line=0.2, solid=!$preview)
    makepoly(ldraw_lib__1_4chrd(solid), step=step, col=col, unit=unit, alt=alt, line=line, solid=solid);
ldraw_lib__1_4chrd(line=0.2);
// file: 3004.scad
use <../lib.scad>
use <s/3004s01.scad>
$fa=1; $fs=0.2;
function ldraw_lib__3004(realsolid=false) = [
// 0 Brick  1 x  2
// 0 Name: 3004.dat
// 0 Author: James Jessiman
// 0 !LDRAW_ORG Part UPDATE 2022-05
// 0 !LICENSE Licensed under CC BY 2.0 and CC BY 4.0 : see CAreadme.txt
// 
// 0 BFC CERTIFY CCW
  [0,"BFC","CERTIFY"],
  [0,"BFC","CCW"],
// 
// 0 !HISTORY 2001-10-26 [PTadmin] Official Update 2001-01
// 0 !HISTORY 2002-05-07 {unknown} BFC Certification
// 0 !HISTORY 2002-06-11 [PTadmin] Official Update 2002-03
// 0 !HISTORY 2007-05-07 [PTadmin] Header formatted for Contributor Agreement
// 0 !HISTORY 2008-07-01 [PTadmin] Official Update 2008-01
// 0 !HISTORY 2022-08-04 [MagFors] Using subfile
// 0 !HISTORY 2022-09-15 [PTadmin] Official Update 2022-05
// 
// 
// 1 16 0 0 0 1 0 0 0 1 0 0 0 1 s\3004s01.dat
  [1,16,0,0,0,1,0,0,0,1,0,0,0,1, ldraw_lib__s__3004s01(realsolid)],
// 4 16 -20 24 -10 20 24 -10 20 0 -10 -20 0 -10
  [4,16,-20,24,-10,20,24,-10,20,0,-10,-20,0,-10],
];
module ldraw_lib__3004(step=0, col=false, unit=2/5, alt=false, line=0.2, solid=!$preview)
    makepoly(ldraw_lib__3004(solid), step=step, col=col, unit=unit, alt=alt, line=line, solid=solid);
ldraw_lib__3004(line=0.2);
// file: s/4111899hs02.scad
use <../../lib.scad>
use <../../p/1-4chrd.scad>
use <../../p/1-4cyli.scad>
use <../../p/box3u12.scad>
$fa=1; $fs=0.2;
function ldraw_lib__s__4111899hs02(realsolid=false) = [
// 0 ~Sticker  0.8 x  3 without Top Surface
// 0 Name: s\4111899hs02.dat
// 0 Author: Ulrich Röder [UR]
// 0 !LDRAW_ORG Subpart UPDATE 2020-03
// 0 !LICENSE Licensed under CC BY 2.0 and CC BY 4.0 : see CAreadme.txt
// 
// 0 BFC CERTIFY CCW
  [0,"BFC","CERTIFY"],
  [0,"BFC","CCW"],
// 
// 0 !HISTORY 2020-12-29 [PTadmin] Official Update 2020-03
// 
// 
// 1 16 0 -0.25 0 29 0 0 0 0.25 0 0 0 8 box3u12.dat
  [1,16,0,-0.25,0,29,0,0,0,0.25,0,0,0,8, ldraw_lib__box3u12(realsolid)],
// 1 16 -29 0 7 0 0 -1 0 -.25 0 1 0 0 1-4cyli.dat
  [1,16,-29,0,7,0,0,-1,0,-.25,0,1,0,0, ldraw_lib__1_4cyli(realsolid)],
// 1 16 -29 0 -7 0 0 -1 0 -.25 0 -1 0 0 1-4cyli.dat
  [1,16,-29,0,-7,0,0,-1,0,-.25,0,-1,0,0, ldraw_lib__1_4cyli(realsolid)],
// 1 16 29 0 -7 0 0 1 0 -.25 0 -1 0 0 1-4cyli.dat
  [1,16,29,0,-7,0,0,1,0,-.25,0,-1,0,0, ldraw_lib__1_4cyli(realsolid)],
// 1 16 29 0 7 1 0 0 0 -.25 0 0 0 1 1-4cyli.dat
  [1,16,29,0,7,1,0,0,0,-.25,0,0,0,1, ldraw_lib__1_4cyli(realsolid)],
// 1 16 -29 0 7 0 0 -1 0 -1 0 1 0 0 1-4chrd.dat
  [1,16,-29,0,7,0,0,-1,0,-1,0,1,0,0, ldraw_lib__1_4chrd(realsolid)],
// 1 16 -29 0 -7 0 0 -1 0 -1 0 -1 0 0 1-4chrd.dat
  [1,16,-29,0,-7,0,0,-1,0,-1,0,-1,0,0, ldraw_lib__1_4chrd(realsolid)],
// 1 16 29 0 -7 0 0 1 0 -1 0 -1 0 0 1-4chrd.dat
  [1,16,29,0,-7,0,0,1,0,-1,0,-1,0,0, ldraw_lib__1_4chrd(realsolid)],
// 1 16 29 0 7 1 0 0 0 -1 0 0 0 1 1-4chrd.dat
  [1,16,29,0,7,1,0,0,0,-1,0,0,0,1, ldraw_lib__1_4chrd(realsolid)],
// 4 16 29 0 8 30 0 7 30 0 -7 29 0 -8
  [4,16,29,0,8,30,0,7,30,0,-7,29,0,-8],
// 4 16 -29 0 -8 -30 0 -7 -30 0 7 -29 0 8
  [4,16,-29,0,-8,-30,0,-7,-30,0,7,-29,0,8],
// 4 16 -30 -.25 7 -30 0 7 -30 0 -7 -30 -.25 -7
  [4,16,-30,-.25,7,-30,0,7,-30,0,-7,-30,-.25,-7],
// 4 16 30 0 -7 30 0 7 30 -.25 7 30 -.25 -7
  [4,16,30,0,-7,30,0,7,30,-.25,7,30,-.25,-7],
];
module ldraw_lib__s__4111899hs02(step=0, col=false, unit=2/5, alt=false, line=0.2, solid=!$preview)
    makepoly(ldraw_lib__s__4111899hs02(solid), step=step, col=col, unit=unit, alt=alt, line=line, solid=solid);
ldraw_lib__s__4111899hs02(line=0.2);
// file: s/4111899hs01.scad
use <../../lib.scad>
use <../../p/1-4chrd.scad>
use <../../p/1-4ndis.scad>
$fa=1; $fs=0.2;
function ldraw_lib__s__4111899hs01(realsolid=false) = [
// 0 ~Sticker  0.8 x  3 with Black Grille - Background
// 0 Name: s\4111899hs01.dat
// 0 Author: Ulrich Röder [UR]
// 0 !LDRAW_ORG Subpart UPDATE 2020-03
// 0 !LICENSE Licensed under CC BY 2.0 and CC BY 4.0 : see CAreadme.txt
// 
// 0 BFC CERTIFY CCW
  [0,"BFC","CERTIFY"],
  [0,"BFC","CCW"],
// 
// 0 !HISTORY 2020-12-29 [PTadmin] Official Update 2020-03
// 
// 
// 1 16 29 -.25 7 1 0 0 0 1 0 0 0 1 1-4chrd.dat
  [1,16,29,-.25,7,1,0,0,0,1,0,0,0,1, ldraw_lib__1_4chrd(realsolid)],
// 1 16 -29 -.25 7 0 0 -1 0 1 0 1 0 0 1-4chrd.dat
  [1,16,-29,-.25,7,0,0,-1,0,1,0,1,0,0, ldraw_lib__1_4chrd(realsolid)],
// 1 16 -29 -.25 -7 0 0 -1 0 1 0 -1 0 0 1-4chrd.dat
  [1,16,-29,-.25,-7,0,0,-1,0,1,0,-1,0,0, ldraw_lib__1_4chrd(realsolid)],
// 1 16 29 -.25 -7 0 0 1 0 1 0 -1 0 0 1-4chrd.dat
  [1,16,29,-.25,-7,0,0,1,0,1,0,-1,0,0, ldraw_lib__1_4chrd(realsolid)],
// 4 16 30 -.25 -7 30 -.25 7 29 -.25 8 29 -.25 -8
  [4,16,30,-.25,-7,30,-.25,7,29,-.25,8,29,-.25,-8],
// 4 16 -30 -.25 7 -30 -.25 -7 -29 -.25 -8 -29 -.25 8
  [4,16,-30,-.25,7,-30,-.25,-7,-29,-.25,-8,-29,-.25,8],
// 1 16 -25 -.25 3 0 0 -3 0 1 0 3 0 0 1-4ndis.dat
  [1,16,-25,-.25,3,0,0,-3,0,1,0,3,0,0, ldraw_lib__1_4ndis(realsolid)],
// 1 16 25 -.25 3 3 0 0 0 1 0 0 0 3 1-4ndis.dat
  [1,16,25,-.25,3,3,0,0,0,1,0,0,0,3, ldraw_lib__1_4ndis(realsolid)],
// 1 16 25 -.25 -3 0 0 3 0 1 0 -3 0 0 1-4ndis.dat
  [1,16,25,-.25,-3,0,0,3,0,1,0,-3,0,0, ldraw_lib__1_4ndis(realsolid)],
// 1 16 -25 -.25 -3 -3 0 0 0 1 0 0 0 -3 1-4ndis.dat
  [1,16,-25,-.25,-3,-3,0,0,0,1,0,0,0,-3, ldraw_lib__1_4ndis(realsolid)],
// 3 16 -29 -.25 8 -28 -.25 6 -25 -.25 6
  [3,16,-29,-.25,8,-28,-.25,6,-25,-.25,6],
// 4 16 25 -.25 6 29 -.25 8 -29 -.25 8 -25 -.25 6
  [4,16,25,-.25,6,29,-.25,8,-29,-.25,8,-25,-.25,6],
// 3 16 29 -.25 8 25 -.25 6 28 -.25 6
  [3,16,29,-.25,8,25,-.25,6,28,-.25,6],
// 3 16 29 -.25 8 28 -.25 6 28 -.25 3
  [3,16,29,-.25,8,28,-.25,6,28,-.25,3],
// 4 16 29 -.25 8 28 -.25 3 28 -.25 -3 29 -.25 -8
  [4,16,29,-.25,8,28,-.25,3,28,-.25,-3,29,-.25,-8],
// 3 16 28 -.25 -3 28 -.25 -6 29 -.25 -8
  [3,16,28,-.25,-3,28,-.25,-6,29,-.25,-8],
// 3 16 28 -.25 -6 25 -.25 -6 29 -.25 -8
  [3,16,28,-.25,-6,25,-.25,-6,29,-.25,-8],
// 4 16 29 -.25 -8 25 -.25 -6 -25 -.25 -6 -29 -.25 -8
  [4,16,29,-.25,-8,25,-.25,-6,-25,-.25,-6,-29,-.25,-8],
// 3 16 -25 -.25 -6 -28 -.25 -6 -29 -.25 -8
  [3,16,-25,-.25,-6,-28,-.25,-6,-29,-.25,-8],
// 3 16 -28 -.25 -3 -29 -.25 -8 -28 -.25 -6
  [3,16,-28,-.25,-3,-29,-.25,-8,-28,-.25,-6],
// 4 16 -29 -.25 -8 -28 -.25 -3 -28 -.25 3 -29 -.25 8
  [4,16,-29,-.25,-8,-28,-.25,-3,-28,-.25,3,-29,-.25,8],
// 3 16 -29 -.25 8 -28 -.25 3 -28 -.25 6
  [3,16,-29,-.25,8,-28,-.25,3,-28,-.25,6],
// 
// 4 0 25 -.25 4 25 -.25 6 -25 -.25 6 -25 -.25 4
  [4,0,25,-.25,4,25,-.25,6,-25,-.25,6,-25,-.25,4],
// 4 0 -26 -.25 2 26 -.25 2 26 -.25 3 -26 -.25 3
  [4,0,-26,-.25,2,26,-.25,2,26,-.25,3,-26,-.25,3],
// 4 0 26 -.25 .5 -26 -.25 .5 -26 -.25 -.5 26 -.25 -.5
  [4,0,26,-.25,.5,-26,-.25,.5,-26,-.25,-.5,26,-.25,-.5],
// 4 0 -26 -.25 -2 -26 -.25 -3 26 -.25 -3 26 -.25 -2
  [4,0,-26,-.25,-2,-26,-.25,-3,26,-.25,-3,26,-.25,-2],
// 4 0 25 -.25 -4 -25 -.25 -4 -25 -.25 -6 25 -.25 -6
  [4,0,25,-.25,-4,-25,-.25,-4,-25,-.25,-6,25,-.25,-6],
// 3 0 -26 -.25 3 -28 -.25 3 -26 -.25 2
  [3,0,-26,-.25,3,-28,-.25,3,-26,-.25,2],
// 3 0 -28 -.25 3 -26 -.25 .5 -26 -.25 2
  [3,0,-28,-.25,3,-26,-.25,.5,-26,-.25,2],
// 4 0 -26 -.25 -.5 -26 -.25 .5 -28 -.25 3 -28 -.25 -3
  [4,0,-26,-.25,-.5,-26,-.25,.5,-28,-.25,3,-28,-.25,-3],
// 3 0 -26 -.25 -.5 -28 -.25 -3 -26 -.25 -2
  [3,0,-26,-.25,-.5,-28,-.25,-3,-26,-.25,-2],
// 3 0 -26 -.25 -2 -28 -.25 -3 -26 -.25 -3
  [3,0,-26,-.25,-2,-28,-.25,-3,-26,-.25,-3],
// 3 0 28 -.25 3 26 -.25 3 26 -.25 2
  [3,0,28,-.25,3,26,-.25,3,26,-.25,2],
// 4 0 28 -.25 3 26 -.25 .5 26 -.25 -.5 28 -.25 -3
  [4,0,28,-.25,3,26,-.25,.5,26,-.25,-.5,28,-.25,-3],
// 3 0 26 -.25 -.5 26 -.25 -2 28 -.25 -3
  [3,0,26,-.25,-.5,26,-.25,-2,28,-.25,-3],
// 3 0 26 -.25 -2 26 -.25 -3 28 -.25 -3
  [3,0,26,-.25,-2,26,-.25,-3,28,-.25,-3],
// 3 0 28 -.25 3 26 -.25 2 26 -.25 .5
  [3,0,28,-.25,3,26,-.25,2,26,-.25,.5],
// 1 0 -25 -.25 3 0 0 -1 0 1 0 1 0 0 1-4ndis.dat
  [1,0,-25,-.25,3,0,0,-1,0,1,0,1,0,0, ldraw_lib__1_4ndis(realsolid)],
// 1 0 25 -.25 3 1 0 0 0 1 0 0 0 1 1-4ndis.dat
  [1,0,25,-.25,3,1,0,0,0,1,0,0,0,1, ldraw_lib__1_4ndis(realsolid)],
// 1 0 25 -.25 -3 0 0 1 0 1 0 -1 0 0 1-4ndis.dat
  [1,0,25,-.25,-3,0,0,1,0,1,0,-1,0,0, ldraw_lib__1_4ndis(realsolid)],
// 1 0 -25 -.25 -3 -1 0 0 0 1 0 0 0 -1 1-4ndis.dat
  [1,0,-25,-.25,-3,-1,0,0,0,1,0,0,0,-1, ldraw_lib__1_4ndis(realsolid)],
// 1 0 -25 -.25 3 0 0 -3 0 1 0 3 0 0 1-4chrd.dat
  [1,0,-25,-.25,3,0,0,-3,0,1,0,3,0,0, ldraw_lib__1_4chrd(realsolid)],
// 1 0 25 -.25 3 3 0 0 0 1 0 0 0 3 1-4chrd.dat
  [1,0,25,-.25,3,3,0,0,0,1,0,0,0,3, ldraw_lib__1_4chrd(realsolid)],
// 1 0 25 -.25 -3 0 0 3 0 1 0 -3 0 0 1-4chrd.dat
  [1,0,25,-.25,-3,0,0,3,0,1,0,-3,0,0, ldraw_lib__1_4chrd(realsolid)],
// 1 0 -25 -.25 -3 -3 0 0 0 1 0 0 0 -3 1-4chrd.dat
  [1,0,-25,-.25,-3,-3,0,0,0,1,0,0,0,-3, ldraw_lib__1_4chrd(realsolid)],
// 3 0 28 -.25 -3 26 -.25 -3 26 -.25 -4
  [3,0,28,-.25,-3,26,-.25,-3,26,-.25,-4],
// 3 0 25 -.25 -4 25 -.25 -6 26 -.25 -4
  [3,0,25,-.25,-4,25,-.25,-6,26,-.25,-4],
// 3 0 26 -.25 -4 25 -.25 -6 28 -.25 -3
  [3,0,26,-.25,-4,25,-.25,-6,28,-.25,-3],
// 3 0 25 -.25 6 25 -.25 4 26 -.25 4
  [3,0,25,-.25,6,25,-.25,4,26,-.25,4],
// 3 0 26 -.25 4 26 -.25 3 28 -.25 3
  [3,0,26,-.25,4,26,-.25,3,28,-.25,3],
// 3 0 25 -.25 6 26 -.25 4 28 -.25 3
  [3,0,25,-.25,6,26,-.25,4,28,-.25,3],
// 3 0 -25 -.25 4 -25 -.25 6 -26 -.25 4
  [3,0,-25,-.25,4,-25,-.25,6,-26,-.25,4],
// 3 0 -28 -.25 3 -26 -.25 3 -26 -.25 4
  [3,0,-28,-.25,3,-26,-.25,3,-26,-.25,4],
// 3 0 -26 -.25 4 -25 -.25 6 -28 -.25 3
  [3,0,-26,-.25,4,-25,-.25,6,-28,-.25,3],
// 3 0 -26 -.25 -4 -26 -.25 -3 -28 -.25 -3
  [3,0,-26,-.25,-4,-26,-.25,-3,-28,-.25,-3],
// 3 0 -25 -.25 -6 -25 -.25 -4 -26 -.25 -4
  [3,0,-25,-.25,-6,-25,-.25,-4,-26,-.25,-4],
// 3 0 -25 -.25 -6 -26 -.25 -4 -28 -.25 -3
  [3,0,-25,-.25,-6,-26,-.25,-4,-28,-.25,-3],
// 
// 1 7 -25 -.25 3 0 0 -1 0 1 0 1 0 0 1-4chrd.dat
  [1,7,-25,-.25,3,0,0,-1,0,1,0,1,0,0, ldraw_lib__1_4chrd(realsolid)],
// 1 7 25 -.25 3 1 0 0 0 1 0 0 0 1 1-4chrd.dat
  [1,7,25,-.25,3,1,0,0,0,1,0,0,0,1, ldraw_lib__1_4chrd(realsolid)],
// 1 7 25 -.25 -3 0 0 1 0 1 0 -1 0 0 1-4chrd.dat
  [1,7,25,-.25,-3,0,0,1,0,1,0,-1,0,0, ldraw_lib__1_4chrd(realsolid)],
// 1 7 -25 -.25 -3 -1 0 0 0 1 0 0 0 -1 1-4chrd.dat
  [1,7,-25,-.25,-3,-1,0,0,0,1,0,0,0,-1, ldraw_lib__1_4chrd(realsolid)],
// 4 7 -25 -.25 4 -26 -.25 3 26 -.25 3 25 -.25 4
  [4,7,-25,-.25,4,-26,-.25,3,26,-.25,3,25,-.25,4],
// 4 7 26 -.25 2 -26 -.25 2 -26 -.25 .5 26 -.25 .5
  [4,7,26,-.25,2,-26,-.25,2,-26,-.25,.5,26,-.25,.5],
// 4 7 26 -.25 -.5 -26 -.25 -.5 -26 -.25 -2 26 -.25 -2
  [4,7,26,-.25,-.5,-26,-.25,-.5,-26,-.25,-2,26,-.25,-2],
// 4 7 -26 -.25 -3 -25 -.25 -4 25 -.25 -4 26 -.25 -3
  [4,7,-26,-.25,-3,-25,-.25,-4,25,-.25,-4,26,-.25,-3],
];
module ldraw_lib__s__4111899hs01(step=0, col=false, unit=2/5, alt=false, line=0.2, solid=!$preview)
    makepoly(ldraw_lib__s__4111899hs01(solid), step=step, col=col, unit=unit, alt=alt, line=line, solid=solid);
ldraw_lib__s__4111899hs01(line=0.2);
// main file
use <../lib.scad>
use <s/4111899hs01.scad>
use <s/4111899hs02.scad>
$fa=1; $fs=0.2;
function ldraw_lib__4111899i(realsolid=false) = [
// 0 Sticker  0.8 x  3 with Black Grille and Light Grey Background
// 0 Name: 4111899i.dat
// 0 Author: Ulrich Röder [UR]
// 0 !LDRAW_ORG Part UPDATE 2020-03
// 0 !LICENSE Licensed under CC BY 2.0 and CC BY 4.0 : see CAreadme.txt
// 
// 0 BFC CERTIFY CCW
  [0,"BFC","CERTIFY"],
  [0,"BFC","CCW"],
// 
// 0 !KEYWORDS Black Thunder, helicopter, Set 5542
// 
// 0 !HISTORY 2020-12-29 [PTadmin] Official Update 2020-03
// 
// 
// 1 7 0 0 0 1 0 0 0 1 0 0 0 1 s\4111899hs01.dat
  [1,7,0,0,0,1,0,0,0,1,0,0,0,1, ldraw_lib__s__4111899hs01(realsolid)],
// 1 16 0 0 0 1 0 0 0 1 0 0 0 1 s\4111899hs02.dat
  [1,16,0,0,0,1,0,0,0,1,0,0,0,1, ldraw_lib__s__4111899hs02(realsolid)],
];
module ldraw_lib__4111899i(step=0, col=false, unit=2/5, alt=false, line=0.2, solid=!$preview)
    makepoly(ldraw_lib__4111899i(solid), step=step, col=col, unit=unit, alt=alt, line=line, solid=solid);
ldraw_lib__4111899i(line=0.2);
